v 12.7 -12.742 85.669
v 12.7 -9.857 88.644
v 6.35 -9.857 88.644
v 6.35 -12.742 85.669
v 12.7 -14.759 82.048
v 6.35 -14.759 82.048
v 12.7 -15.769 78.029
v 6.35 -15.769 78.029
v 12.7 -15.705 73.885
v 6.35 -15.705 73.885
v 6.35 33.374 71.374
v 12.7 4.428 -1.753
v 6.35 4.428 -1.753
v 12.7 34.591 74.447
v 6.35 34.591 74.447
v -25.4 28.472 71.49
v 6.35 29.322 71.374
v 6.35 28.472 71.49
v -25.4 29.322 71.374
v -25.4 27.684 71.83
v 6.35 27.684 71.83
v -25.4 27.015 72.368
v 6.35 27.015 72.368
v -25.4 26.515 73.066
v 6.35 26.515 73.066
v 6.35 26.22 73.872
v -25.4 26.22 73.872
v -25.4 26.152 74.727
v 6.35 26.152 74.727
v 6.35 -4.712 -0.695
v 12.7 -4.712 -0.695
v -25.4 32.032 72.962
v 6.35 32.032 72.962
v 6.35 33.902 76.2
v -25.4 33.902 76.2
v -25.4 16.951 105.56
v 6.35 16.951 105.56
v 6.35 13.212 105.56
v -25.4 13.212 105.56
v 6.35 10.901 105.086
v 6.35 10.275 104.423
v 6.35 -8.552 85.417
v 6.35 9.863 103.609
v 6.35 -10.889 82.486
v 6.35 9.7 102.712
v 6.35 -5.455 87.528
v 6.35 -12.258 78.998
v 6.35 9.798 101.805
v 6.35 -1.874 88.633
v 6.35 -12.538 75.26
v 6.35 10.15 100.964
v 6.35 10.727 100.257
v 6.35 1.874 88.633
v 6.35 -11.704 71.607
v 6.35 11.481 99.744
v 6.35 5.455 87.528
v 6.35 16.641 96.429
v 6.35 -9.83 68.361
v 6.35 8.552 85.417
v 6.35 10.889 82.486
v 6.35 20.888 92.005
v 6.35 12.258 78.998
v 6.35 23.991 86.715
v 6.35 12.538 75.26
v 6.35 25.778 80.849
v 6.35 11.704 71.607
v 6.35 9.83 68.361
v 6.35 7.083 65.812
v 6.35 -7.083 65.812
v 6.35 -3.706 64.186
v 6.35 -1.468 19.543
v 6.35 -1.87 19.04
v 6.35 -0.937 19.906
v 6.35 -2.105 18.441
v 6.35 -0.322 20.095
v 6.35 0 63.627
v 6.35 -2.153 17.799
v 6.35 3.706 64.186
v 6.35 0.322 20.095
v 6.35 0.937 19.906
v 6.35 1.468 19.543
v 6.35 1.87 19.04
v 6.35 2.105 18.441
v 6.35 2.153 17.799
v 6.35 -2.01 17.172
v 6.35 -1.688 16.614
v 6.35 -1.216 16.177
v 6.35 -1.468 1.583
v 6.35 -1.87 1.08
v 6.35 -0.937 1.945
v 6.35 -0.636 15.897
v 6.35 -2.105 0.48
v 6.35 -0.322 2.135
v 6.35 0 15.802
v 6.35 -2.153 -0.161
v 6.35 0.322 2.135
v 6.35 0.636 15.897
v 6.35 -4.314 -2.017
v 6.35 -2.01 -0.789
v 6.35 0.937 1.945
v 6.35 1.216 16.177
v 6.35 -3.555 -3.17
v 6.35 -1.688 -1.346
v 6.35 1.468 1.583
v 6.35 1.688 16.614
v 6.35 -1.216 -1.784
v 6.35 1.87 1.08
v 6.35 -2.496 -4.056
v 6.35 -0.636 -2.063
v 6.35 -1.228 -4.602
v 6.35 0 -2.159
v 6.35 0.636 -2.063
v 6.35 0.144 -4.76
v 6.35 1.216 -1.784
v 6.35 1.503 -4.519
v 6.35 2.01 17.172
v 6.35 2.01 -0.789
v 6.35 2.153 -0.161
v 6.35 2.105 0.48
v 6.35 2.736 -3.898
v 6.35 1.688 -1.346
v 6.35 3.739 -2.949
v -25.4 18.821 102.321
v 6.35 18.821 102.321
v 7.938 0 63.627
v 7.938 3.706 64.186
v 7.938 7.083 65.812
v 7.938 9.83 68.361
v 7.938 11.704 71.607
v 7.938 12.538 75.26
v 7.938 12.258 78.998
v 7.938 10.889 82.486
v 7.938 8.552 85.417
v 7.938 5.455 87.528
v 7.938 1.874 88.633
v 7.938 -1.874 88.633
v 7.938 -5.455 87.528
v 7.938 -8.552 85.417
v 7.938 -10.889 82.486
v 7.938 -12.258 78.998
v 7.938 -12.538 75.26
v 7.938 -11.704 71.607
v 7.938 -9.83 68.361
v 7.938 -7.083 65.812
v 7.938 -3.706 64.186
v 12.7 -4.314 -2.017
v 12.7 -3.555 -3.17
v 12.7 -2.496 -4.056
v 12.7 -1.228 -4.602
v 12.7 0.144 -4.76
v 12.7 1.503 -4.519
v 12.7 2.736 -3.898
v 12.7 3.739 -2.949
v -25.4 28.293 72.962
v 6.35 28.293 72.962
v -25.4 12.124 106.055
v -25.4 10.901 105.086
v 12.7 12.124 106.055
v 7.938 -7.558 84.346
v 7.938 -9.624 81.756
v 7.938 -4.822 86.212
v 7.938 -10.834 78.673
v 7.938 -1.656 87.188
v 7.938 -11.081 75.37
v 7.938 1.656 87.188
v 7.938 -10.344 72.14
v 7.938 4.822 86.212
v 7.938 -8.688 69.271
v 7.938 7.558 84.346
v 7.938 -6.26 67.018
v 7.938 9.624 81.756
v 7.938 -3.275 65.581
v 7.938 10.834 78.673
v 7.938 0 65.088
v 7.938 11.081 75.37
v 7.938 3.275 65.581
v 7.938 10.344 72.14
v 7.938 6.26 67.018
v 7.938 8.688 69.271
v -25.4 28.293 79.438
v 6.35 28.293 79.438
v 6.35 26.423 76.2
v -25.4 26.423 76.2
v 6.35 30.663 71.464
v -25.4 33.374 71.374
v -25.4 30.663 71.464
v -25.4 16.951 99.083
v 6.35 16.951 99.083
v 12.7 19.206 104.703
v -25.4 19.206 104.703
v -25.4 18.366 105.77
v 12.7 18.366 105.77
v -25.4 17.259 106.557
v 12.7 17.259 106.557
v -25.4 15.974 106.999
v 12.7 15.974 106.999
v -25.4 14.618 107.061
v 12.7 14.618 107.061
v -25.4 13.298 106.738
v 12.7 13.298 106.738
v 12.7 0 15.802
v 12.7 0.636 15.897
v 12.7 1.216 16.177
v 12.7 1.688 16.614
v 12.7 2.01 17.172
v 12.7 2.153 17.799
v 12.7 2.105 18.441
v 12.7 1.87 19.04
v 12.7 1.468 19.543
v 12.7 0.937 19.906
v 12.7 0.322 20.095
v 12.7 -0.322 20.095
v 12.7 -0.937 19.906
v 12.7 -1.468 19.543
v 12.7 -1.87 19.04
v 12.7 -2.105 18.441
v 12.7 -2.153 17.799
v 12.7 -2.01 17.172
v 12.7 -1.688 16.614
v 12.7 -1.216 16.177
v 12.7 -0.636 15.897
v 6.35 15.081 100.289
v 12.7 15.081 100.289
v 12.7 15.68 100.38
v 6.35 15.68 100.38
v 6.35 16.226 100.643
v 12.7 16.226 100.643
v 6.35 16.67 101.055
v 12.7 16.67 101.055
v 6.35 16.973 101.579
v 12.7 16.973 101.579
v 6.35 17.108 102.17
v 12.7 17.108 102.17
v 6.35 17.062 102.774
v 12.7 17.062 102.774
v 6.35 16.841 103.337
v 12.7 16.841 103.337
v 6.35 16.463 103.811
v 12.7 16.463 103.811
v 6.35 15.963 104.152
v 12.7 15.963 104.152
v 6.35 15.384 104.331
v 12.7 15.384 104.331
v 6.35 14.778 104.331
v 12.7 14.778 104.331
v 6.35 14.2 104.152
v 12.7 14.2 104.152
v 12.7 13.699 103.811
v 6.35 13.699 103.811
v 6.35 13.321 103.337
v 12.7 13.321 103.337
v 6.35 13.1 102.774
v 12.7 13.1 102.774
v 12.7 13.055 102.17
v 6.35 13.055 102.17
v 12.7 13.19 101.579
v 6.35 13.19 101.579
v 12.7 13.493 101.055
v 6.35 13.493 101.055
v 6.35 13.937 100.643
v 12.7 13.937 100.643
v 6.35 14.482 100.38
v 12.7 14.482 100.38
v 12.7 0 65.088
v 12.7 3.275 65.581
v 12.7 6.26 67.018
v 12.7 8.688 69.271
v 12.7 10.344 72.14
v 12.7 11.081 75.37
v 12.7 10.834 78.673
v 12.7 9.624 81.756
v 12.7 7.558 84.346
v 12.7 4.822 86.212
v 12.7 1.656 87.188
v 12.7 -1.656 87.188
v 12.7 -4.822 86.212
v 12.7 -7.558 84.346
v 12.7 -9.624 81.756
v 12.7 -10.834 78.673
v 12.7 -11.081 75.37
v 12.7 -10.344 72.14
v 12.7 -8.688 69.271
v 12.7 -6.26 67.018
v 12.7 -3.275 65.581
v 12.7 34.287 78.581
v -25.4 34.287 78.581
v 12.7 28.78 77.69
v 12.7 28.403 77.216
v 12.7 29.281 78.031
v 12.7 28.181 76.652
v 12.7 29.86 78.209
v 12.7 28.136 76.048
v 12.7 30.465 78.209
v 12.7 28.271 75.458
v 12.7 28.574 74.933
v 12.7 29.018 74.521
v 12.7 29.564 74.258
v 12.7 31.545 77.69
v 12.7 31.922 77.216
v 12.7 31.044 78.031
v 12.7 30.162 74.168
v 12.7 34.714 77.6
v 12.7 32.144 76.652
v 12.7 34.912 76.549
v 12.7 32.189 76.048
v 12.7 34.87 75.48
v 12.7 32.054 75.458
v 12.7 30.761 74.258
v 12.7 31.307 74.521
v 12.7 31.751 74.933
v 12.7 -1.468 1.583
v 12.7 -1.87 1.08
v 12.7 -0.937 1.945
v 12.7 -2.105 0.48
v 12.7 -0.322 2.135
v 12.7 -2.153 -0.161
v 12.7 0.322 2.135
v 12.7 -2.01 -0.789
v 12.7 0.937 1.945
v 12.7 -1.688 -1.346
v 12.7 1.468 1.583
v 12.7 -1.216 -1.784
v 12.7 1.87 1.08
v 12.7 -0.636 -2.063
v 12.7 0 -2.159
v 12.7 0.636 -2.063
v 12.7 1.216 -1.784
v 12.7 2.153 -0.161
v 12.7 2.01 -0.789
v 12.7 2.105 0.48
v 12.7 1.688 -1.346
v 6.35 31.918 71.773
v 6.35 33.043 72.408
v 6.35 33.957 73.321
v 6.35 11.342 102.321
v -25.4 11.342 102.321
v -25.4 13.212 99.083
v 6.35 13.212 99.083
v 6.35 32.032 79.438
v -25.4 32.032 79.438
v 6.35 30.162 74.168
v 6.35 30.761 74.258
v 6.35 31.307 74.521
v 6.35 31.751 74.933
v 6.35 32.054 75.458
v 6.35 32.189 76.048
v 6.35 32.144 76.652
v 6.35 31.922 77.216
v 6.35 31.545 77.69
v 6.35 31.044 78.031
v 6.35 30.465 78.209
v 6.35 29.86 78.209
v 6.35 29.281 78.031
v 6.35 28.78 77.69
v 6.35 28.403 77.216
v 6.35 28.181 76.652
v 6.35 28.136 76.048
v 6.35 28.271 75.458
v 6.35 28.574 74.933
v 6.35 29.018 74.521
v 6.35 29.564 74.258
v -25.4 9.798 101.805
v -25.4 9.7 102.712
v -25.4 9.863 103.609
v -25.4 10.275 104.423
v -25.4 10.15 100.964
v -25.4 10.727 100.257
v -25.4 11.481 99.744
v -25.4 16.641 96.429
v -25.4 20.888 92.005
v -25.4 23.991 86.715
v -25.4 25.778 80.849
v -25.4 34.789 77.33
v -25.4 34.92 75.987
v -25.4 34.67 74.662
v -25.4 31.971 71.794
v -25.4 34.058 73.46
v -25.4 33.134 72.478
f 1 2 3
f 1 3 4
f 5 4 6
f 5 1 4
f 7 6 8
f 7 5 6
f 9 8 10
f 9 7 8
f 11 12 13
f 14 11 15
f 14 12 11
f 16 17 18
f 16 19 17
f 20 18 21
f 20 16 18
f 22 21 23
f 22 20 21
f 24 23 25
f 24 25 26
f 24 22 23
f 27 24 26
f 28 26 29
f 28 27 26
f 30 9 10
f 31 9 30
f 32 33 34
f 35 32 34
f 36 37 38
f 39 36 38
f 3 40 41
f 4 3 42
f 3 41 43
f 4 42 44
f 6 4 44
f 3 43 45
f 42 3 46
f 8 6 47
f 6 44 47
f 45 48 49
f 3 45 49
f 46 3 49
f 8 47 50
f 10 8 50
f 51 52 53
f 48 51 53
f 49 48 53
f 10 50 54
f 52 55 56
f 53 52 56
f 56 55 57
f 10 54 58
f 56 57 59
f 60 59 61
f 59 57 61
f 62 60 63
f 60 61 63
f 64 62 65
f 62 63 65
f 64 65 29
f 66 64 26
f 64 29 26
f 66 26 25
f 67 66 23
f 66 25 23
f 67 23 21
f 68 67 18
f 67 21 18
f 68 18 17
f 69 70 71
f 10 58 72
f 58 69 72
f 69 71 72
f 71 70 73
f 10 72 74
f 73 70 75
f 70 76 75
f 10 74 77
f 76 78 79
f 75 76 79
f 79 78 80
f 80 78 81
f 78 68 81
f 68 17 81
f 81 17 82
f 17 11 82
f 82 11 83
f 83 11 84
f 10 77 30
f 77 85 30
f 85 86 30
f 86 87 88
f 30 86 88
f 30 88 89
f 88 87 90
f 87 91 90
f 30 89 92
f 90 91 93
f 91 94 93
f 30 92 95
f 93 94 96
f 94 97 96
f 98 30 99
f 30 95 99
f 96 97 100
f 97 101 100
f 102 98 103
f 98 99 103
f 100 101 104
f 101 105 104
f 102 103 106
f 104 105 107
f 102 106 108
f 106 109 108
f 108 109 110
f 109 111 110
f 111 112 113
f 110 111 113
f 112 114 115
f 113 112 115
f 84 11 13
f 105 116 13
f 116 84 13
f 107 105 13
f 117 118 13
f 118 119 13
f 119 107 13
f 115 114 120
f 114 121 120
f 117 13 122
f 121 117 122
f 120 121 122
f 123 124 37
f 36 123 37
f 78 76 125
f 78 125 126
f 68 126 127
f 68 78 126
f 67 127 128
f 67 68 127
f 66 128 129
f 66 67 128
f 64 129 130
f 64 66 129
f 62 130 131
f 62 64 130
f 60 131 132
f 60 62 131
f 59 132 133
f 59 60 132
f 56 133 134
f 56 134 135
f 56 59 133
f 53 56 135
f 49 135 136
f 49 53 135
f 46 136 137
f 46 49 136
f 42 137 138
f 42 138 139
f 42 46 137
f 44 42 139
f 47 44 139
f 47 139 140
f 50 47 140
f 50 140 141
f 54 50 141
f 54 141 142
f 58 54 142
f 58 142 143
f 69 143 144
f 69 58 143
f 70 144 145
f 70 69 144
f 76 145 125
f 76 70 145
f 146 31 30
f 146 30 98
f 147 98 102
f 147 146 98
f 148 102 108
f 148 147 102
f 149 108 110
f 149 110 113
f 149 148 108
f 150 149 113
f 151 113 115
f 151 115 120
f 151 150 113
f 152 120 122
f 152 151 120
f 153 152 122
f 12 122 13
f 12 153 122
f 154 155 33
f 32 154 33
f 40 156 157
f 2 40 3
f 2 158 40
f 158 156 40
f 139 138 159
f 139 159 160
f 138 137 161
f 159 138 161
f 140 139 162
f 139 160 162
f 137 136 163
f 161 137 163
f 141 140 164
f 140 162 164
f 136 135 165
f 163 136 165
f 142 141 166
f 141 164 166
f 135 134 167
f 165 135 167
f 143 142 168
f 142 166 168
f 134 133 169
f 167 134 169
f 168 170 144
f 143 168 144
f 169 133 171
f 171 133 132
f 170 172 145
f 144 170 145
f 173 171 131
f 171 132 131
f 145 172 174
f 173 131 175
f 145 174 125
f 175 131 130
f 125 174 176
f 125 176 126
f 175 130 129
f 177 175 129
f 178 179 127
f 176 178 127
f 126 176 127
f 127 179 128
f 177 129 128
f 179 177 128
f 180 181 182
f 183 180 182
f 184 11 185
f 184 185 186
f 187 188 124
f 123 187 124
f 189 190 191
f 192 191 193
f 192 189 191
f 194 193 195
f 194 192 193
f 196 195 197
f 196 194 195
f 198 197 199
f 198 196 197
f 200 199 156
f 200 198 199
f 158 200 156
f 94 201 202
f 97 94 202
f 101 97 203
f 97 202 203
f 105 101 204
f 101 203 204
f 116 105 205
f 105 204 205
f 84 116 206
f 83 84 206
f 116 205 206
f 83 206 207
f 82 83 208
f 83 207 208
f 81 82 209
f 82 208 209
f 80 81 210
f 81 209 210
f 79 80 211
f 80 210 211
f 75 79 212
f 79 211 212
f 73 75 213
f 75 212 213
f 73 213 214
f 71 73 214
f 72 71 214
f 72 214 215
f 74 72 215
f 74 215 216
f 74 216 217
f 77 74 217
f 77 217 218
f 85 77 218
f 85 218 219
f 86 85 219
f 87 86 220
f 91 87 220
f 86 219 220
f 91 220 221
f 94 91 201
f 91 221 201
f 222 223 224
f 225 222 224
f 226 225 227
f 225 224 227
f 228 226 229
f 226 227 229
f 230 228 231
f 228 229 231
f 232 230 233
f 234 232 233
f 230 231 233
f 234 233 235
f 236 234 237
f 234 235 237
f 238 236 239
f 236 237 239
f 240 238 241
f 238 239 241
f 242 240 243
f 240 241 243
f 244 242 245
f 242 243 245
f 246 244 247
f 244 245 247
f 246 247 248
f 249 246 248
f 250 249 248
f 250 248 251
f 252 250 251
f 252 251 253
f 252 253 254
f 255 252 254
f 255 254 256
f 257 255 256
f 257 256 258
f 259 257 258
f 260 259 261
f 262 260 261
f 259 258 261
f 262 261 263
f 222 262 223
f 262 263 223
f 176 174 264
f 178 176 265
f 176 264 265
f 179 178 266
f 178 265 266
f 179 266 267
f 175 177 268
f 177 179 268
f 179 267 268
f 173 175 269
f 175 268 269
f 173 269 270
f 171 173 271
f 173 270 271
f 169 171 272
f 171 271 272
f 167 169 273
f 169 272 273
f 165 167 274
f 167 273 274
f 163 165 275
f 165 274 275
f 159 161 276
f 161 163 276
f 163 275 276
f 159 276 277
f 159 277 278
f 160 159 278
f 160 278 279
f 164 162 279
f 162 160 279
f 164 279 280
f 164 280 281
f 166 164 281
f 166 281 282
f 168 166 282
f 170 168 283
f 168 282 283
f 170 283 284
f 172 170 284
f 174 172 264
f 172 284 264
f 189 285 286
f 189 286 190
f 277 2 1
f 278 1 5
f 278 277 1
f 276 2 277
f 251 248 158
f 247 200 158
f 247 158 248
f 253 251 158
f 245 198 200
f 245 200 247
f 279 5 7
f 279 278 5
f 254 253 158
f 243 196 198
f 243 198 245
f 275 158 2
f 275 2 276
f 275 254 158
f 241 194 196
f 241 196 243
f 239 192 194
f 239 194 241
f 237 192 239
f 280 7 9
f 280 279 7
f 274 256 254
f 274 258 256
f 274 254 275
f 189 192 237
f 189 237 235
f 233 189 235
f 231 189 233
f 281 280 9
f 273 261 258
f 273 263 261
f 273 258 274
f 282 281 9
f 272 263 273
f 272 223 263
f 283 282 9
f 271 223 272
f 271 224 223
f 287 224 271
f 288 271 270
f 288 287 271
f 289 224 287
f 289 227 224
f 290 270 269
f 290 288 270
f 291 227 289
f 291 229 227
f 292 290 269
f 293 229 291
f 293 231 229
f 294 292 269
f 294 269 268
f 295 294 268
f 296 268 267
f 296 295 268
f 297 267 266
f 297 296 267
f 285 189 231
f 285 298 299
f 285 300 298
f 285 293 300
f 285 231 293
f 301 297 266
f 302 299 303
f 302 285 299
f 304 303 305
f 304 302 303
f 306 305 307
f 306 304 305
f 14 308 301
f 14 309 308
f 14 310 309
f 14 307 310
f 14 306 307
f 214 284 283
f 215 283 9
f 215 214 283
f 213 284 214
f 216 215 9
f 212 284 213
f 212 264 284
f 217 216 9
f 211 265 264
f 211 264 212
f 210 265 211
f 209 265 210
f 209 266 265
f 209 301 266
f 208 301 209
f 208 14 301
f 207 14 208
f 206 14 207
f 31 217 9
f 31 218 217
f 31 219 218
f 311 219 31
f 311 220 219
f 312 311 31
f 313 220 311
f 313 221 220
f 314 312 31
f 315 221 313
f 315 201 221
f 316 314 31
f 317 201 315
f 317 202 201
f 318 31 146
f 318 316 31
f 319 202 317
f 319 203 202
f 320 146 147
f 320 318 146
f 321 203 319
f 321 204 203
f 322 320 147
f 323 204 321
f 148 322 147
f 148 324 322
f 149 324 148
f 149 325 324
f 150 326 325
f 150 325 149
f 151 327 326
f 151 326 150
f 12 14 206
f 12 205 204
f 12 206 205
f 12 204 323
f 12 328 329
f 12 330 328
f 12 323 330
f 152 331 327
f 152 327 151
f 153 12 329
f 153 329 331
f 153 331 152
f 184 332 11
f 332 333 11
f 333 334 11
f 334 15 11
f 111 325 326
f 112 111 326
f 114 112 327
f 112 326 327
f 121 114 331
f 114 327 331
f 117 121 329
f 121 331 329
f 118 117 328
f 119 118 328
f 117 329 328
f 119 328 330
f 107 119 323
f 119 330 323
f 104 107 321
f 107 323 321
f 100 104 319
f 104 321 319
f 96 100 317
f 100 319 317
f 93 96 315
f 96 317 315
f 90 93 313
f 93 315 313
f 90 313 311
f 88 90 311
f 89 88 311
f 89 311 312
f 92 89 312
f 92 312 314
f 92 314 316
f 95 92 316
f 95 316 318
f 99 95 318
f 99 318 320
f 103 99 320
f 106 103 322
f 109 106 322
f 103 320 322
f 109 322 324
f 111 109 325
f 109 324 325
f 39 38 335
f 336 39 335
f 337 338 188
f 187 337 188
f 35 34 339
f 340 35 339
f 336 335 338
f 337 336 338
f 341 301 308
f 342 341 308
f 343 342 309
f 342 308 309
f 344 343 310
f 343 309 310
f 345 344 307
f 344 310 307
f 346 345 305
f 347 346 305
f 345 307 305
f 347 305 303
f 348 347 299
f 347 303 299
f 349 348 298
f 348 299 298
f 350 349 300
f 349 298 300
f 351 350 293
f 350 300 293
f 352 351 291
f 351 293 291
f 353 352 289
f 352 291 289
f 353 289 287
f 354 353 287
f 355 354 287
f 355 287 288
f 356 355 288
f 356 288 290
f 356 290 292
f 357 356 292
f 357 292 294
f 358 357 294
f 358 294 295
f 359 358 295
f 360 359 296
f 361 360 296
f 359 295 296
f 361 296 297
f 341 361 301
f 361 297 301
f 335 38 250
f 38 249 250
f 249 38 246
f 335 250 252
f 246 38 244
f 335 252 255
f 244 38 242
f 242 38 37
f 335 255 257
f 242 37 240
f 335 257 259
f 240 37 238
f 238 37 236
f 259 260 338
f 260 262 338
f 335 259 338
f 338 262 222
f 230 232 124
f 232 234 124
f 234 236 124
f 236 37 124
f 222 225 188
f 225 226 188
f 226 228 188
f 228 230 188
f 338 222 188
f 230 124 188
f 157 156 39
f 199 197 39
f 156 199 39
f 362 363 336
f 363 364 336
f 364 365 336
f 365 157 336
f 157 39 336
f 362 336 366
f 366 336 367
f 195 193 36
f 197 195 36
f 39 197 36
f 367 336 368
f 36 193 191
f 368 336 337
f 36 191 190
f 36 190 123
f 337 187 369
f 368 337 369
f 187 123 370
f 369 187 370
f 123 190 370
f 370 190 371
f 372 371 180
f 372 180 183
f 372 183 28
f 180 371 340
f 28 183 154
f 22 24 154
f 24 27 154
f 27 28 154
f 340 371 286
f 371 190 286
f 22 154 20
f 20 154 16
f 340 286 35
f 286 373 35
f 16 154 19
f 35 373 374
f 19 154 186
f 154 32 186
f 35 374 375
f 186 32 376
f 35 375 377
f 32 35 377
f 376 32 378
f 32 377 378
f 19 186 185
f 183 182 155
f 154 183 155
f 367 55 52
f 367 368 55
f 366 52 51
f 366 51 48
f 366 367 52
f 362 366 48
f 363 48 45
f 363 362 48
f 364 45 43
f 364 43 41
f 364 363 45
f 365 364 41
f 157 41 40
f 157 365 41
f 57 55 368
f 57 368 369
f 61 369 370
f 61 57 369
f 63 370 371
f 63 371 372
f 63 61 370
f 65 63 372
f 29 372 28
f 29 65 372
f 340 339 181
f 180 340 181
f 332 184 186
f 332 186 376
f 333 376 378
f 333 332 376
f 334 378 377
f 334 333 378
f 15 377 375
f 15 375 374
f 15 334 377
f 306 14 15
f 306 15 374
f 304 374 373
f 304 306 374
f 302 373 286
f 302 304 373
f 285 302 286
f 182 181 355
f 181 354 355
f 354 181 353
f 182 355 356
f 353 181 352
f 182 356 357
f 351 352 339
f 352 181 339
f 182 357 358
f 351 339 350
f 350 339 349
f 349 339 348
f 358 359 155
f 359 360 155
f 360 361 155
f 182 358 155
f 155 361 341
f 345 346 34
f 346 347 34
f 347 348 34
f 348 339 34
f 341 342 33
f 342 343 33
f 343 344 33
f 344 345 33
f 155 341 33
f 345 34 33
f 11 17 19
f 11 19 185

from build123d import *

# Parameters (mm, degrees)
SKETCH1_R           = 2.159
SKETCH1_R_2         = 11.112499999999992
SKETCH1_R_3         = 2.032000000000007
SKETCH1_R_4         = 2.0320000000000227
SKETCH1_R_5         = 2.159000000000001
BOSS_EXTRUDE1_DEPTH = 6.35
SKETCH2_R           = 12.573000000000004
CUT_EXTRUDE1_DEPTH  = 1.5875
BOSS_EXTRUDE2_DEPTH = 31.75
FILLET1_R           = 3.175


with BuildPart() as part:
    # Sketch1 → Boss-Extrude1 (new body)
    with BuildSketch(Plane(origin=(0, 0, 0), x_dir=(0, 0, -1), z_dir=(1, 0, 0))):
        with BuildLine():
            Line((1.7528307479226393, 4.428203994751931), (-74.44716925207737, 34.59070399475192))
            ThreePointArc((-74.44716925207737, 34.59070399475192), (-76.54899129091997, 34.912195919620736), (-78.58125, 34.28694598552338))
            Line((-78.58125, 34.28694598552338), (-104.70274124164806, 19.205695985523498))
            ThreePointArc((-104.70274124164806, 19.205695985523498), (-106.99949191381467, 15.974399461853373), (-106.05477455872966, 12.124224142081344))
            Line((-106.05477455872966, 12.124224142081344), (-88.64427772360533, -9.856752859729227))
            ThreePointArc((-88.64427772360533, -9.856752859729227), (-82.04819337667968, -14.758531743671528), (-73.88489583333335, -15.705283114209777))
            Line((-73.88489583333335, -15.705283114209777), (0.6945312500000005, -4.711584934262932))
            ThreePointArc((0.6945312500000005, -4.711584934262932), (4.730891100411702, -0.5477916082283132), (1.7528307479226393, 4.428203994751931))
        make_face()
        Circle(SKETCH1_R, mode=Mode.SUBTRACT)
        with Locations((-76.2, -9.33e-15)):
            Circle(SKETCH1_R_2, mode=Mode.SUBTRACT)
        with Locations((-76.2, 30.162499999999987)):
            Circle(SKETCH1_R_3, mode=Mode.SUBTRACT)
        with Locations((-102.32149124164806, 15.081250000000113)):
            Circle(SKETCH1_R_4, mode=Mode.SUBTRACT)
        with Locations((-17.960512242138307, -2.2e-15)):
            Circle(SKETCH1_R_5, mode=Mode.SUBTRACT)
    extrude(amount=BOSS_EXTRUDE1_DEPTH)

    # Sketch2 → Cut-Extrude1 (cut)
    with BuildSketch(Plane(origin=(6.35, 0, 0), x_dir=(0, 0, -1), z_dir=(1, 0, 0))):
        with Locations((-76.2, -9.33e-15)):
            Circle(SKETCH2_R)
    extrude(amount=-CUT_EXTRUDE1_DEPTH, mode=Mode.SUBTRACT)

    # Sketch3 → Boss-Extrude2 (add)
    with BuildSketch(Plane(origin=(6.35, 0, 0), x_dir=(0, 0, -1), z_dir=(1, 0, 0))):
        with BuildLine():
            Line((-78.58125000000001, 34.286945985523374), (-104.70274124164803, 19.20569598552344))
            ThreePointArc((-104.70274124164803, 19.20569598552344), (-106.9994919138146, 15.974399461853357), (-106.05477455872966, 12.124224142081344))
            Line((-106.05477455872966, 12.124224142081344), (-101.58067912721546, 6.475620904888487))
            ThreePointArc((-101.58067912721546, 6.475620904888487), (-90.28737650298505, 22.08298807511437), (-71.374, 25.745334782490193))
            Line((-71.374, 25.745334782490193), (-71.374, 33.37424116580463))
            Line((-71.374, 33.37424116580463), (-71.46391508012837, 30.663405062626204))
            ThreePointArc((-71.46391508012837, 30.663405062626204), (-74.0392538140866, 34.40662325104498), (-78.58125000000001, 34.286945985523374))
        make_face()
        Polygon((-76.19999999999999, 33.901997693541205), (-79.4385, 32.03224884677059), (-79.4385, 28.292751153229368), (-76.20000000000002, 26.42300230645877), (-72.9615, 28.292751153229386), (-72.9615, 32.03224884677061), align=None, mode=Mode.SUBTRACT)
        Polygon((-102.32149124164808, 18.820747693541325), (-105.55999124164805, 16.950998846770727), (-105.55999124164805, 13.211501153229527), (-102.32149124164805, 11.341752306458922), (-99.08299124164807, 13.211501153229516), (-99.08299124164807, 16.95099884677072), align=None, mode=Mode.SUBTRACT)
    extrude(amount=BOSS_EXTRUDE2_DEPTH)

    # Fillet1
    fillet1_edges = [part.edges().sort_by_distance(p)[0] for p in [
        (22.225, 25.745334782490197, 71.374),
        (22.225, 6.475620904888487, 101.58067912721546),
    ]]
    fillet(fillet1_edges, radius=FILLET1_R)


with BuildPart() as body_2:
    # Mirror1: mirrored copy
    add(part.part.mirror(Plane(origin=(6.35, 0, 0), x_dir=(0, 0, 1), z_dir=(1, 0, 0))))


solid = body_2.part
